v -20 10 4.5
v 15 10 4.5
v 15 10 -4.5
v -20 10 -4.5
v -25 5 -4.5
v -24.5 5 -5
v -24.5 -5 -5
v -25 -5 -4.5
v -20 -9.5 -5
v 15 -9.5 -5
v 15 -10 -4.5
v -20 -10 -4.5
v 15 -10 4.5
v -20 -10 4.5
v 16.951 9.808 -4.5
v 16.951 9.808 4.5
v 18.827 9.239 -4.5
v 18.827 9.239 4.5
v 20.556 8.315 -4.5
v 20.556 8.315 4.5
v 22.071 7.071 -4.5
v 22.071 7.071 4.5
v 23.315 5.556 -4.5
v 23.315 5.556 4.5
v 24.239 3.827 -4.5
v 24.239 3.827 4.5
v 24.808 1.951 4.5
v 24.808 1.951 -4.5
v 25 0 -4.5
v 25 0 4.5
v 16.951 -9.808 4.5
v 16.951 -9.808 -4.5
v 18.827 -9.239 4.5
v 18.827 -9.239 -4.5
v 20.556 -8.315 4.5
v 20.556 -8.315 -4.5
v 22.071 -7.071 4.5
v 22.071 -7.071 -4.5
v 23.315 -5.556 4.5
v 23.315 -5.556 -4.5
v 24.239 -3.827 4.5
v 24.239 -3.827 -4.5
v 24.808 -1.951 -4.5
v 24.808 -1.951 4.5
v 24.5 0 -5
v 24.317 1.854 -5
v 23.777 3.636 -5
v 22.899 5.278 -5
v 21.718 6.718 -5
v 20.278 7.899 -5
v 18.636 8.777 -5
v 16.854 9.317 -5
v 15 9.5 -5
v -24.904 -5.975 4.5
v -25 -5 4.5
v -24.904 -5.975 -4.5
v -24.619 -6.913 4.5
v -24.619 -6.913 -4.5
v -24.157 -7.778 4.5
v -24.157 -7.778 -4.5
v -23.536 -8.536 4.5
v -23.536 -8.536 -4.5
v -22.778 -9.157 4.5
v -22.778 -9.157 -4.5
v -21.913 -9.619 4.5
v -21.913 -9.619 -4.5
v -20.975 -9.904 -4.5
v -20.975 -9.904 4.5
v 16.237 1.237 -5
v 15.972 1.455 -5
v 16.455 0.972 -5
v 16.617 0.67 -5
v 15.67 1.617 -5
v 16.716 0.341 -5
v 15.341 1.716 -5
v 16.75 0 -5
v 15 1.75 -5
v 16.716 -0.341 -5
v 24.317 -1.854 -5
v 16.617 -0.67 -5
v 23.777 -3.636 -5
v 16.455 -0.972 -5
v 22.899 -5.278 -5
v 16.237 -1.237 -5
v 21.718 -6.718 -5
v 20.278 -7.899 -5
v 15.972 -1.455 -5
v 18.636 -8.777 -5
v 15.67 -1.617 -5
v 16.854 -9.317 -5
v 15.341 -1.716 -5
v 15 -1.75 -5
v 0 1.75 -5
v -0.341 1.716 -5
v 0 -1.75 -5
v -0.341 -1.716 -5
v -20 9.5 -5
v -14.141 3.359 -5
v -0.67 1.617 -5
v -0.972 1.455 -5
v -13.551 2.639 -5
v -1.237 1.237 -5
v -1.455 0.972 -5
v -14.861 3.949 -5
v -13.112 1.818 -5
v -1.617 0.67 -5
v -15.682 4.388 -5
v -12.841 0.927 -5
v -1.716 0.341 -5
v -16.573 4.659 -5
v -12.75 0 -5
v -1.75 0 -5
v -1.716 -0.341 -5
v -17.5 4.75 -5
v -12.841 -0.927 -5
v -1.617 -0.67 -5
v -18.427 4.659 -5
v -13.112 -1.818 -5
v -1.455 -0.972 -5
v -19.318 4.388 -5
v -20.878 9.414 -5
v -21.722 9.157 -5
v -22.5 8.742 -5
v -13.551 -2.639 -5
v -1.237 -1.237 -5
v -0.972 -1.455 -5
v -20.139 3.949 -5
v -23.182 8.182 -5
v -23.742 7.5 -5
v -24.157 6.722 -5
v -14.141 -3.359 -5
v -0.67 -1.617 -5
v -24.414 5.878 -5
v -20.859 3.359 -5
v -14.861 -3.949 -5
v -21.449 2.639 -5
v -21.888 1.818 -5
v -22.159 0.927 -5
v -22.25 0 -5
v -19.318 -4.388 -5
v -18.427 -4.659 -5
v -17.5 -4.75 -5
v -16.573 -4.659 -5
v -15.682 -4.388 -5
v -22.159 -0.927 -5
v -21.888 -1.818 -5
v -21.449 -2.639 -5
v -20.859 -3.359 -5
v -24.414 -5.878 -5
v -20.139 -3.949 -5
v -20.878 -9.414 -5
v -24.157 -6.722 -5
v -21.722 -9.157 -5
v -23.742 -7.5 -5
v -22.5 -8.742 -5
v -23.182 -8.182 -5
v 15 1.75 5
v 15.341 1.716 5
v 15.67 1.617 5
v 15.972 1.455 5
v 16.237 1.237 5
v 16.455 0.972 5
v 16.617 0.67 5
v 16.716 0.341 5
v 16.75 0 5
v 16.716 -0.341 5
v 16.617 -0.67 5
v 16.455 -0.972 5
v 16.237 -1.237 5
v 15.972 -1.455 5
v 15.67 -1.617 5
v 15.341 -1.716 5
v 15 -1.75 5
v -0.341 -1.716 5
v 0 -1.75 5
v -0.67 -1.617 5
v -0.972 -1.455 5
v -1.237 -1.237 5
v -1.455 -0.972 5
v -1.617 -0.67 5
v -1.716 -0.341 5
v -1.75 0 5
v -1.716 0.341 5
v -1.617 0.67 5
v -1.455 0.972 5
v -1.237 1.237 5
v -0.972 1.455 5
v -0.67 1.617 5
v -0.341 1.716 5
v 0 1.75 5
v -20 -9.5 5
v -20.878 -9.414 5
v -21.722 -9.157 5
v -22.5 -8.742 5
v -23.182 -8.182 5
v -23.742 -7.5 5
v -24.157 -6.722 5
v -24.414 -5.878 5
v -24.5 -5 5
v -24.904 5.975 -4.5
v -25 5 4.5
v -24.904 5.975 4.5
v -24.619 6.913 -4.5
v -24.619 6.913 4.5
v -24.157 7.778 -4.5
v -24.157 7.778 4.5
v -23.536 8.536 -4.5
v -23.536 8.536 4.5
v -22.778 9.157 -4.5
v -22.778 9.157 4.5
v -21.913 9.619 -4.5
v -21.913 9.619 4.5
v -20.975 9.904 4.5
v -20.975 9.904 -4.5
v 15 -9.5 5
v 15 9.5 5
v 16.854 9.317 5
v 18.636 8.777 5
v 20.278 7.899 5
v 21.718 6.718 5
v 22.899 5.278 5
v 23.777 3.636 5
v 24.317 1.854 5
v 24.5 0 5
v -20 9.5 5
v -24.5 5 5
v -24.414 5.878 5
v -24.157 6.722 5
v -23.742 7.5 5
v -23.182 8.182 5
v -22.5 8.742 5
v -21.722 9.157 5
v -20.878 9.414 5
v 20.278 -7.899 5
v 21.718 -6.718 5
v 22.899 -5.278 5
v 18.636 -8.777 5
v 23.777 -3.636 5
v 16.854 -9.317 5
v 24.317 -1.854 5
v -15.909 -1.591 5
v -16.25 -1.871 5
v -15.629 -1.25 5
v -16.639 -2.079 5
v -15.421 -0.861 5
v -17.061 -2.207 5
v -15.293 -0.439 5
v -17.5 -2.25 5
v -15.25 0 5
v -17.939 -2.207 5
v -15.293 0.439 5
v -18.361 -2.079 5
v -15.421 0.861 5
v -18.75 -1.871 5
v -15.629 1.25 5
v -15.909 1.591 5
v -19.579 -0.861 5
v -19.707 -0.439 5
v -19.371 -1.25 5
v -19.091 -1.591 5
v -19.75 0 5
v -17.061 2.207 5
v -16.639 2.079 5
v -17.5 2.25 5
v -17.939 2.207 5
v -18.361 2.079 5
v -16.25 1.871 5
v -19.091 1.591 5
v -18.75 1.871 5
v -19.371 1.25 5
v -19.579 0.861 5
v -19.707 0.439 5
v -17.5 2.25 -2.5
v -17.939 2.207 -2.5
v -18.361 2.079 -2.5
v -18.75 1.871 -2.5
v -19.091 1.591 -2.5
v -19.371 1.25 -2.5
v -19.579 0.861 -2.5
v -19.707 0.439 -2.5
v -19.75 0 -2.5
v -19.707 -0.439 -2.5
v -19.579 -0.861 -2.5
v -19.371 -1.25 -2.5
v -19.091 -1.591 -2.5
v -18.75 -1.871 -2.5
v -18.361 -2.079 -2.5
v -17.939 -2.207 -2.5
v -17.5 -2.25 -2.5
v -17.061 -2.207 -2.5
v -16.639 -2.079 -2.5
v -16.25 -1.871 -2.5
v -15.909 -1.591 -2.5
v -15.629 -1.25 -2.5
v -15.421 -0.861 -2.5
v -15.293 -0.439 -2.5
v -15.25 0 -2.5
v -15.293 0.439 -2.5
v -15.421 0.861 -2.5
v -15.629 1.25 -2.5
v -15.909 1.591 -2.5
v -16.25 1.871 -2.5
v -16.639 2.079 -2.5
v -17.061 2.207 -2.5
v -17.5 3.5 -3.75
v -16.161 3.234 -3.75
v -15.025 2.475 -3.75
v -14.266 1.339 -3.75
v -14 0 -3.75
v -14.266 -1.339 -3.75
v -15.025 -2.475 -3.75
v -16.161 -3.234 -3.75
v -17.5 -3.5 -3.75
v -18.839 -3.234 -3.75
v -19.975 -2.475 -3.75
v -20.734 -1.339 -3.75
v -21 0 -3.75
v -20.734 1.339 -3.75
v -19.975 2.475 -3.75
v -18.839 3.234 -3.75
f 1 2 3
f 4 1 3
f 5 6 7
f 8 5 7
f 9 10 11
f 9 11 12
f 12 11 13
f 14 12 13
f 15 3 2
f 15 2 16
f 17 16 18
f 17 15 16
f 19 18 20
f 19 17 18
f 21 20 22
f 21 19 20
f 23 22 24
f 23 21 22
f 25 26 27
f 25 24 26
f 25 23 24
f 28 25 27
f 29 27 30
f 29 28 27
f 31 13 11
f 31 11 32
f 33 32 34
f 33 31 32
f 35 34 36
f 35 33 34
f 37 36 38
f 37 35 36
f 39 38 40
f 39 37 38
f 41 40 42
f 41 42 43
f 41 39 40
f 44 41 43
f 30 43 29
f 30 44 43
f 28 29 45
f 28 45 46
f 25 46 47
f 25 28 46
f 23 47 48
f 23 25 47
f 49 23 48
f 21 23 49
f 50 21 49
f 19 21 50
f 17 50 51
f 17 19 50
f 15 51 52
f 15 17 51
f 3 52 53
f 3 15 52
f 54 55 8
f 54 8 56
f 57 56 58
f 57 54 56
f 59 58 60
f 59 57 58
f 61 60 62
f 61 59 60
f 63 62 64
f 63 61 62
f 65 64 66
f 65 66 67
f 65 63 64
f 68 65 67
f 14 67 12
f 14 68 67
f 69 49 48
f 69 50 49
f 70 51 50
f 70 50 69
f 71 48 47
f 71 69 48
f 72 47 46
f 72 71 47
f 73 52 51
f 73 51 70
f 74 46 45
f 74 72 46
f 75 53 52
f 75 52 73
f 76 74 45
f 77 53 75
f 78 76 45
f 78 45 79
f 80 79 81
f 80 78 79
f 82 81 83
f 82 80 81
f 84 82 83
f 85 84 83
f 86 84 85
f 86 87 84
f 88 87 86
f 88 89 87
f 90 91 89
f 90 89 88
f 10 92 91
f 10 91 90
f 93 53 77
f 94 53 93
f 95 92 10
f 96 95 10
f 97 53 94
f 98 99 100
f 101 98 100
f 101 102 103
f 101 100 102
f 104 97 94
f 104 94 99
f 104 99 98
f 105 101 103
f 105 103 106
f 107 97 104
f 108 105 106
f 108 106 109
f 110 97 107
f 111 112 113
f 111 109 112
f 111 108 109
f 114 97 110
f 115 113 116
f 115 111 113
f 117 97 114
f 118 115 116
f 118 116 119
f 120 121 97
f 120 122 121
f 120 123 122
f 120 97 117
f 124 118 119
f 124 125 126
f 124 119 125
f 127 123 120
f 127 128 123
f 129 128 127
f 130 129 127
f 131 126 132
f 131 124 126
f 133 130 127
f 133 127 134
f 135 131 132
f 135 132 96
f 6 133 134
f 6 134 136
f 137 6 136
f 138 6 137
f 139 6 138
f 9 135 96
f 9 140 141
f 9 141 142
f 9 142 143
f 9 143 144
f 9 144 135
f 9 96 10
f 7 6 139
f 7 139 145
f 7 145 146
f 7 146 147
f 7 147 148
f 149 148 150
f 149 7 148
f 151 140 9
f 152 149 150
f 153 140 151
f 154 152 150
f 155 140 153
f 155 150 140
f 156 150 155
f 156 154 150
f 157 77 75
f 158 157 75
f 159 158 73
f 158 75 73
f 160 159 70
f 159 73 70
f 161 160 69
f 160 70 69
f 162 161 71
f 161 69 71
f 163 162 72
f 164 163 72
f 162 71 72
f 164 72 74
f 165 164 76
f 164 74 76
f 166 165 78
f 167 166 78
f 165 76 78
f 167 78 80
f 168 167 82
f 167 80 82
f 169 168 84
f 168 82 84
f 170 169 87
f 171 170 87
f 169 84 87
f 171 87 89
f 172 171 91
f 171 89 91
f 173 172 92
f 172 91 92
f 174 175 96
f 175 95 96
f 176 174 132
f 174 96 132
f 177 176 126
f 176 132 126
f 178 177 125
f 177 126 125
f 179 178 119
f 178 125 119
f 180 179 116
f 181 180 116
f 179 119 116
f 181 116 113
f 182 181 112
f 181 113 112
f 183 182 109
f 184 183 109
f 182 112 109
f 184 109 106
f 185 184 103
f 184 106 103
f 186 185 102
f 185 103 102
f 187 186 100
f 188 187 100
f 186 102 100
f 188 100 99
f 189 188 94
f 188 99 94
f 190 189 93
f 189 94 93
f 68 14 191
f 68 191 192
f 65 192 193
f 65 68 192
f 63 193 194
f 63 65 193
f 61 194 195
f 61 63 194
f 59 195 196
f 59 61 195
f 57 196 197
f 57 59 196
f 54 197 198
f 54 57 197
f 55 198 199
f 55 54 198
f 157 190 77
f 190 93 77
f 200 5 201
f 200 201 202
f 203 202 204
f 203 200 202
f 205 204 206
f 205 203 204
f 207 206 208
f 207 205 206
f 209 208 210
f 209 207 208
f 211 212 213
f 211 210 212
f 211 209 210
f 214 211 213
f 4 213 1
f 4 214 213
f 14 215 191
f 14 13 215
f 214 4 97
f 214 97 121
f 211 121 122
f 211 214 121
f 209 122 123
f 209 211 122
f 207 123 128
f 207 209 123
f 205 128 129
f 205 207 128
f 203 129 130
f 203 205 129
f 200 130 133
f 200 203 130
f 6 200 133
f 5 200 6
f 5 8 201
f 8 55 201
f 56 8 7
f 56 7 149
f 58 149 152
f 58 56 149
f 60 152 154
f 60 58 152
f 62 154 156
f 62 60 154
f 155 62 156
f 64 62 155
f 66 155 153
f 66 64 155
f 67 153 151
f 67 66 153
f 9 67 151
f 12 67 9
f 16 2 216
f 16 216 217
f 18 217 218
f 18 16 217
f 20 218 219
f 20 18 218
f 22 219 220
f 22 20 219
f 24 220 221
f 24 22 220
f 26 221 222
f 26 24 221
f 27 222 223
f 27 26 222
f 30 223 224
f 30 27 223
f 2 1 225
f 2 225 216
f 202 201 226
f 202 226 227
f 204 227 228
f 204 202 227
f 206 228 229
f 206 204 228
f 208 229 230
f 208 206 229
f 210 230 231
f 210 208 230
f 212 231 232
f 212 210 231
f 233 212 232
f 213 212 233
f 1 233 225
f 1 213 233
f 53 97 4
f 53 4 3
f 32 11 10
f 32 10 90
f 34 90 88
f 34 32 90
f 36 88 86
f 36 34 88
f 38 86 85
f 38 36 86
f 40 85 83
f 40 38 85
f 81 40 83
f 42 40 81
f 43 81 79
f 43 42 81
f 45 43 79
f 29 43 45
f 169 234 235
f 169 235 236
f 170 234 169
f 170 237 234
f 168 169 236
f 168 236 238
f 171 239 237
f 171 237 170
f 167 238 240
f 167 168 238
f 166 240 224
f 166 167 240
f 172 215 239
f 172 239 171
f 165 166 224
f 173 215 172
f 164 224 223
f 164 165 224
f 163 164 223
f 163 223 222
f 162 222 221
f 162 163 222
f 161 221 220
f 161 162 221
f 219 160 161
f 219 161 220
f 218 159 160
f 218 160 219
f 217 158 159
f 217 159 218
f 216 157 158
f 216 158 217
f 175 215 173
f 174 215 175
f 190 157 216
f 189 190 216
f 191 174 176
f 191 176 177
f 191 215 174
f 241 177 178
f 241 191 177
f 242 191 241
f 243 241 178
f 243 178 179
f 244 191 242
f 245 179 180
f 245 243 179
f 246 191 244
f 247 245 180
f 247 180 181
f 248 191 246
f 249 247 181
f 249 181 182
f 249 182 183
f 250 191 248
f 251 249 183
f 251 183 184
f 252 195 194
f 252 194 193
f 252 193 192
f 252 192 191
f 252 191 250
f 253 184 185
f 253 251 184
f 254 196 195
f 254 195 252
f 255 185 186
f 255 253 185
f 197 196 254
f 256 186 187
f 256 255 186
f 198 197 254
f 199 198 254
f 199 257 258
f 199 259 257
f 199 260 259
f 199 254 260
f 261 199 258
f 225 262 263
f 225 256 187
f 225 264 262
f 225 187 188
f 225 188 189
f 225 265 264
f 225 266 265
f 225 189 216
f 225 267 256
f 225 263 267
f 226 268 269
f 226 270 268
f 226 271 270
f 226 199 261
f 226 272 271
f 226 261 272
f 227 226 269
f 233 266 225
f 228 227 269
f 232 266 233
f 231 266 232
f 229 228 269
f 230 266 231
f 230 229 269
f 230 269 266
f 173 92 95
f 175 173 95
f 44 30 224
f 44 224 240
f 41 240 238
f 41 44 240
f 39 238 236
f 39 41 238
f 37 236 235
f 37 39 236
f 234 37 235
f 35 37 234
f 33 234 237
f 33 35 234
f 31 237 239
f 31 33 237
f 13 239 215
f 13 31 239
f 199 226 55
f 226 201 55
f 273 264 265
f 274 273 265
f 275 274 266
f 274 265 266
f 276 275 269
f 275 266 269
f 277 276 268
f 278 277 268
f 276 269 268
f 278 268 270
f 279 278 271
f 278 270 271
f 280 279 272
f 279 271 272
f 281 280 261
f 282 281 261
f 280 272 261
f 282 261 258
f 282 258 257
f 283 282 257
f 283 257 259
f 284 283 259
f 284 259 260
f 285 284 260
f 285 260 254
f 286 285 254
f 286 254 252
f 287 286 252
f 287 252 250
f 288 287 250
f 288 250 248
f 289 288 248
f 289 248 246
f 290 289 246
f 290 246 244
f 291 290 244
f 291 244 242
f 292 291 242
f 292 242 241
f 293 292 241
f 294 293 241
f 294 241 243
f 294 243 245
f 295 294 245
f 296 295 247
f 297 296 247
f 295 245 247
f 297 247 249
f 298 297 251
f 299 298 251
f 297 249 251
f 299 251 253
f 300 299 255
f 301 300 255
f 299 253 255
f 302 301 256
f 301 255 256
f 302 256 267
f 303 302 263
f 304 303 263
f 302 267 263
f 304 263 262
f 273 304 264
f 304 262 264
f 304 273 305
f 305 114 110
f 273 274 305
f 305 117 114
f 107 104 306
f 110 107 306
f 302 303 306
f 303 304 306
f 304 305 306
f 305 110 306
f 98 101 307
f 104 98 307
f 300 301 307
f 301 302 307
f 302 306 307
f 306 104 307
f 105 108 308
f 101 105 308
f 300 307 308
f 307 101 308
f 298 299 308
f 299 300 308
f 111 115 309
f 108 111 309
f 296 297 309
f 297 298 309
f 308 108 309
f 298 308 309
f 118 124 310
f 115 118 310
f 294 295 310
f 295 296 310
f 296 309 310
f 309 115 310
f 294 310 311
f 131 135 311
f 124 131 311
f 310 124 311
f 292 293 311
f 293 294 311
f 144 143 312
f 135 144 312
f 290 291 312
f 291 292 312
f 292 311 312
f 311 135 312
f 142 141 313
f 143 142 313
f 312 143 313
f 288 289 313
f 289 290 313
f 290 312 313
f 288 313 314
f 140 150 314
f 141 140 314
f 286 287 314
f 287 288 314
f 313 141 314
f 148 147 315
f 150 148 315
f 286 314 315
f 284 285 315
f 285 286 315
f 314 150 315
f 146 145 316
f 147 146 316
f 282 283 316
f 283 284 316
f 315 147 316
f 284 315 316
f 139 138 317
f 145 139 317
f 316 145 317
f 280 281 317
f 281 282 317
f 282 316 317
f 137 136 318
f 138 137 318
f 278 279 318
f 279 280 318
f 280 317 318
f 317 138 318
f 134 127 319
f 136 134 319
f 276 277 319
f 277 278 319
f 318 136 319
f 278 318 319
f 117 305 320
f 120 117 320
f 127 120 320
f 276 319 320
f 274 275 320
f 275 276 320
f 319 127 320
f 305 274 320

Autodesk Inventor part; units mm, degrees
ref_plane "YZ Plane" through (0, 0, 0) normal (1, 0, 0) x (0, 1, 0)
ref_plane "XZ Plane" through (0, 0, 0) normal (0, 1, 0) x (-1, 0, 0)
ref_plane "XY Plane" through (0, 0, 0) normal (0, 0, 1) x (1, 0, 0)
sketch "Sketch1" plane through (0, 0, 0) normal (1, 0, 0) x (0, 1, 0)
  line L0 (-10, 5) -> (10, 5)
  line L1 (10, 5) -> (10, -5)
  line L2 (10, -5) -> (-10, -5)
  line L3 (-10, -5) -> (-10, 5)
  line L4 (-10, 5) -> (10, -5) construction
  line L5 (10, 5) -> (-10, -5) construction
  point P0 (0, 0)
  dimension "Width" = 20
  dimension "Thickness" = 10
extrude "Extrusion1" add sketch "Sketch1" along normal mid plane 50
sketch "Sketch6" plane through (25, 10, -5) normal (0, 0, -1) x (-1, 0, 0)
  line L0 (50, 0) -> (50, -20) projected
  line L1 (50, 0) -> (0, 0) projected
  point P0 (25, -10)
  point P1 (42.5, -10)
  dimension "d40" = 7.5
  dimension "d56" = 10
hole "Hole5" at (-17.5, 0, -5) direction (0, 0, 1) diameter 4.5 depth 10.65 tip angle 118 countersink diameter 9.5 countersink angle 90
sketch "Sketch7" plane through (-25, -10, 5) normal (0, 0, 1) x (1, 0, 0)
  point P0 (25, 10)
fillet "Fillet1" radius 10 2 edges at (25, 10, 0) (25, -10, 0)
sketch "Sketch9" plane through (-25, -10, -5) normal (0, 0, -1) x (-1, 0, 0)
  line L0 (-25, 10) -> (-40, 10) construction
  line L1 (-25, 11.75) -> (-40, 11.75)
  line L2 (-40, 8.25) -> (-25, 8.25)
  arc A0 (-25, 8.25) -> (-25, 11.75) centre (-25, 10) ccw
  arc A1 (-40, 11.75) -> (-40, 8.25) centre (-40, 10) ccw
  line L3 (0, 20) -> (0, 0) projected
  line L4 (-40, 0) -> (0, 0) projected
  point P0 (-32.5, 10)
  dimension "d58" = 15
  dimension "d59" = 25
  dimension "d60" = 10
  dimension "d62" = 3.5
extrude "Extrusion2" cut sketch "Sketch9" against normal blind 10
fillet "Fillet2" radius 5 2 edges at (-25, 10, 0) (-25, -10, 0)
chamfer "Chamfer1" distance 0.5 angle 45 12 edges at (-2.4997, 10, -5) (22.0712, 7.0712, -5) (-2.4997, -10, -5) (-23.5355, -8.5355, -5) (-25, 0, -5) (-23.5355, 8.5355, -5) (-2.4997, 10, 5) (22.0712, 7.0712, 5) (-2.4997, -10, 5) (-23.5355, -8.5355, 5) (-25, 0, 5) (-23.5355, 8.5355, 5)
properties part number "Bell Support Beam" material "Brass, Soft Yellow"
